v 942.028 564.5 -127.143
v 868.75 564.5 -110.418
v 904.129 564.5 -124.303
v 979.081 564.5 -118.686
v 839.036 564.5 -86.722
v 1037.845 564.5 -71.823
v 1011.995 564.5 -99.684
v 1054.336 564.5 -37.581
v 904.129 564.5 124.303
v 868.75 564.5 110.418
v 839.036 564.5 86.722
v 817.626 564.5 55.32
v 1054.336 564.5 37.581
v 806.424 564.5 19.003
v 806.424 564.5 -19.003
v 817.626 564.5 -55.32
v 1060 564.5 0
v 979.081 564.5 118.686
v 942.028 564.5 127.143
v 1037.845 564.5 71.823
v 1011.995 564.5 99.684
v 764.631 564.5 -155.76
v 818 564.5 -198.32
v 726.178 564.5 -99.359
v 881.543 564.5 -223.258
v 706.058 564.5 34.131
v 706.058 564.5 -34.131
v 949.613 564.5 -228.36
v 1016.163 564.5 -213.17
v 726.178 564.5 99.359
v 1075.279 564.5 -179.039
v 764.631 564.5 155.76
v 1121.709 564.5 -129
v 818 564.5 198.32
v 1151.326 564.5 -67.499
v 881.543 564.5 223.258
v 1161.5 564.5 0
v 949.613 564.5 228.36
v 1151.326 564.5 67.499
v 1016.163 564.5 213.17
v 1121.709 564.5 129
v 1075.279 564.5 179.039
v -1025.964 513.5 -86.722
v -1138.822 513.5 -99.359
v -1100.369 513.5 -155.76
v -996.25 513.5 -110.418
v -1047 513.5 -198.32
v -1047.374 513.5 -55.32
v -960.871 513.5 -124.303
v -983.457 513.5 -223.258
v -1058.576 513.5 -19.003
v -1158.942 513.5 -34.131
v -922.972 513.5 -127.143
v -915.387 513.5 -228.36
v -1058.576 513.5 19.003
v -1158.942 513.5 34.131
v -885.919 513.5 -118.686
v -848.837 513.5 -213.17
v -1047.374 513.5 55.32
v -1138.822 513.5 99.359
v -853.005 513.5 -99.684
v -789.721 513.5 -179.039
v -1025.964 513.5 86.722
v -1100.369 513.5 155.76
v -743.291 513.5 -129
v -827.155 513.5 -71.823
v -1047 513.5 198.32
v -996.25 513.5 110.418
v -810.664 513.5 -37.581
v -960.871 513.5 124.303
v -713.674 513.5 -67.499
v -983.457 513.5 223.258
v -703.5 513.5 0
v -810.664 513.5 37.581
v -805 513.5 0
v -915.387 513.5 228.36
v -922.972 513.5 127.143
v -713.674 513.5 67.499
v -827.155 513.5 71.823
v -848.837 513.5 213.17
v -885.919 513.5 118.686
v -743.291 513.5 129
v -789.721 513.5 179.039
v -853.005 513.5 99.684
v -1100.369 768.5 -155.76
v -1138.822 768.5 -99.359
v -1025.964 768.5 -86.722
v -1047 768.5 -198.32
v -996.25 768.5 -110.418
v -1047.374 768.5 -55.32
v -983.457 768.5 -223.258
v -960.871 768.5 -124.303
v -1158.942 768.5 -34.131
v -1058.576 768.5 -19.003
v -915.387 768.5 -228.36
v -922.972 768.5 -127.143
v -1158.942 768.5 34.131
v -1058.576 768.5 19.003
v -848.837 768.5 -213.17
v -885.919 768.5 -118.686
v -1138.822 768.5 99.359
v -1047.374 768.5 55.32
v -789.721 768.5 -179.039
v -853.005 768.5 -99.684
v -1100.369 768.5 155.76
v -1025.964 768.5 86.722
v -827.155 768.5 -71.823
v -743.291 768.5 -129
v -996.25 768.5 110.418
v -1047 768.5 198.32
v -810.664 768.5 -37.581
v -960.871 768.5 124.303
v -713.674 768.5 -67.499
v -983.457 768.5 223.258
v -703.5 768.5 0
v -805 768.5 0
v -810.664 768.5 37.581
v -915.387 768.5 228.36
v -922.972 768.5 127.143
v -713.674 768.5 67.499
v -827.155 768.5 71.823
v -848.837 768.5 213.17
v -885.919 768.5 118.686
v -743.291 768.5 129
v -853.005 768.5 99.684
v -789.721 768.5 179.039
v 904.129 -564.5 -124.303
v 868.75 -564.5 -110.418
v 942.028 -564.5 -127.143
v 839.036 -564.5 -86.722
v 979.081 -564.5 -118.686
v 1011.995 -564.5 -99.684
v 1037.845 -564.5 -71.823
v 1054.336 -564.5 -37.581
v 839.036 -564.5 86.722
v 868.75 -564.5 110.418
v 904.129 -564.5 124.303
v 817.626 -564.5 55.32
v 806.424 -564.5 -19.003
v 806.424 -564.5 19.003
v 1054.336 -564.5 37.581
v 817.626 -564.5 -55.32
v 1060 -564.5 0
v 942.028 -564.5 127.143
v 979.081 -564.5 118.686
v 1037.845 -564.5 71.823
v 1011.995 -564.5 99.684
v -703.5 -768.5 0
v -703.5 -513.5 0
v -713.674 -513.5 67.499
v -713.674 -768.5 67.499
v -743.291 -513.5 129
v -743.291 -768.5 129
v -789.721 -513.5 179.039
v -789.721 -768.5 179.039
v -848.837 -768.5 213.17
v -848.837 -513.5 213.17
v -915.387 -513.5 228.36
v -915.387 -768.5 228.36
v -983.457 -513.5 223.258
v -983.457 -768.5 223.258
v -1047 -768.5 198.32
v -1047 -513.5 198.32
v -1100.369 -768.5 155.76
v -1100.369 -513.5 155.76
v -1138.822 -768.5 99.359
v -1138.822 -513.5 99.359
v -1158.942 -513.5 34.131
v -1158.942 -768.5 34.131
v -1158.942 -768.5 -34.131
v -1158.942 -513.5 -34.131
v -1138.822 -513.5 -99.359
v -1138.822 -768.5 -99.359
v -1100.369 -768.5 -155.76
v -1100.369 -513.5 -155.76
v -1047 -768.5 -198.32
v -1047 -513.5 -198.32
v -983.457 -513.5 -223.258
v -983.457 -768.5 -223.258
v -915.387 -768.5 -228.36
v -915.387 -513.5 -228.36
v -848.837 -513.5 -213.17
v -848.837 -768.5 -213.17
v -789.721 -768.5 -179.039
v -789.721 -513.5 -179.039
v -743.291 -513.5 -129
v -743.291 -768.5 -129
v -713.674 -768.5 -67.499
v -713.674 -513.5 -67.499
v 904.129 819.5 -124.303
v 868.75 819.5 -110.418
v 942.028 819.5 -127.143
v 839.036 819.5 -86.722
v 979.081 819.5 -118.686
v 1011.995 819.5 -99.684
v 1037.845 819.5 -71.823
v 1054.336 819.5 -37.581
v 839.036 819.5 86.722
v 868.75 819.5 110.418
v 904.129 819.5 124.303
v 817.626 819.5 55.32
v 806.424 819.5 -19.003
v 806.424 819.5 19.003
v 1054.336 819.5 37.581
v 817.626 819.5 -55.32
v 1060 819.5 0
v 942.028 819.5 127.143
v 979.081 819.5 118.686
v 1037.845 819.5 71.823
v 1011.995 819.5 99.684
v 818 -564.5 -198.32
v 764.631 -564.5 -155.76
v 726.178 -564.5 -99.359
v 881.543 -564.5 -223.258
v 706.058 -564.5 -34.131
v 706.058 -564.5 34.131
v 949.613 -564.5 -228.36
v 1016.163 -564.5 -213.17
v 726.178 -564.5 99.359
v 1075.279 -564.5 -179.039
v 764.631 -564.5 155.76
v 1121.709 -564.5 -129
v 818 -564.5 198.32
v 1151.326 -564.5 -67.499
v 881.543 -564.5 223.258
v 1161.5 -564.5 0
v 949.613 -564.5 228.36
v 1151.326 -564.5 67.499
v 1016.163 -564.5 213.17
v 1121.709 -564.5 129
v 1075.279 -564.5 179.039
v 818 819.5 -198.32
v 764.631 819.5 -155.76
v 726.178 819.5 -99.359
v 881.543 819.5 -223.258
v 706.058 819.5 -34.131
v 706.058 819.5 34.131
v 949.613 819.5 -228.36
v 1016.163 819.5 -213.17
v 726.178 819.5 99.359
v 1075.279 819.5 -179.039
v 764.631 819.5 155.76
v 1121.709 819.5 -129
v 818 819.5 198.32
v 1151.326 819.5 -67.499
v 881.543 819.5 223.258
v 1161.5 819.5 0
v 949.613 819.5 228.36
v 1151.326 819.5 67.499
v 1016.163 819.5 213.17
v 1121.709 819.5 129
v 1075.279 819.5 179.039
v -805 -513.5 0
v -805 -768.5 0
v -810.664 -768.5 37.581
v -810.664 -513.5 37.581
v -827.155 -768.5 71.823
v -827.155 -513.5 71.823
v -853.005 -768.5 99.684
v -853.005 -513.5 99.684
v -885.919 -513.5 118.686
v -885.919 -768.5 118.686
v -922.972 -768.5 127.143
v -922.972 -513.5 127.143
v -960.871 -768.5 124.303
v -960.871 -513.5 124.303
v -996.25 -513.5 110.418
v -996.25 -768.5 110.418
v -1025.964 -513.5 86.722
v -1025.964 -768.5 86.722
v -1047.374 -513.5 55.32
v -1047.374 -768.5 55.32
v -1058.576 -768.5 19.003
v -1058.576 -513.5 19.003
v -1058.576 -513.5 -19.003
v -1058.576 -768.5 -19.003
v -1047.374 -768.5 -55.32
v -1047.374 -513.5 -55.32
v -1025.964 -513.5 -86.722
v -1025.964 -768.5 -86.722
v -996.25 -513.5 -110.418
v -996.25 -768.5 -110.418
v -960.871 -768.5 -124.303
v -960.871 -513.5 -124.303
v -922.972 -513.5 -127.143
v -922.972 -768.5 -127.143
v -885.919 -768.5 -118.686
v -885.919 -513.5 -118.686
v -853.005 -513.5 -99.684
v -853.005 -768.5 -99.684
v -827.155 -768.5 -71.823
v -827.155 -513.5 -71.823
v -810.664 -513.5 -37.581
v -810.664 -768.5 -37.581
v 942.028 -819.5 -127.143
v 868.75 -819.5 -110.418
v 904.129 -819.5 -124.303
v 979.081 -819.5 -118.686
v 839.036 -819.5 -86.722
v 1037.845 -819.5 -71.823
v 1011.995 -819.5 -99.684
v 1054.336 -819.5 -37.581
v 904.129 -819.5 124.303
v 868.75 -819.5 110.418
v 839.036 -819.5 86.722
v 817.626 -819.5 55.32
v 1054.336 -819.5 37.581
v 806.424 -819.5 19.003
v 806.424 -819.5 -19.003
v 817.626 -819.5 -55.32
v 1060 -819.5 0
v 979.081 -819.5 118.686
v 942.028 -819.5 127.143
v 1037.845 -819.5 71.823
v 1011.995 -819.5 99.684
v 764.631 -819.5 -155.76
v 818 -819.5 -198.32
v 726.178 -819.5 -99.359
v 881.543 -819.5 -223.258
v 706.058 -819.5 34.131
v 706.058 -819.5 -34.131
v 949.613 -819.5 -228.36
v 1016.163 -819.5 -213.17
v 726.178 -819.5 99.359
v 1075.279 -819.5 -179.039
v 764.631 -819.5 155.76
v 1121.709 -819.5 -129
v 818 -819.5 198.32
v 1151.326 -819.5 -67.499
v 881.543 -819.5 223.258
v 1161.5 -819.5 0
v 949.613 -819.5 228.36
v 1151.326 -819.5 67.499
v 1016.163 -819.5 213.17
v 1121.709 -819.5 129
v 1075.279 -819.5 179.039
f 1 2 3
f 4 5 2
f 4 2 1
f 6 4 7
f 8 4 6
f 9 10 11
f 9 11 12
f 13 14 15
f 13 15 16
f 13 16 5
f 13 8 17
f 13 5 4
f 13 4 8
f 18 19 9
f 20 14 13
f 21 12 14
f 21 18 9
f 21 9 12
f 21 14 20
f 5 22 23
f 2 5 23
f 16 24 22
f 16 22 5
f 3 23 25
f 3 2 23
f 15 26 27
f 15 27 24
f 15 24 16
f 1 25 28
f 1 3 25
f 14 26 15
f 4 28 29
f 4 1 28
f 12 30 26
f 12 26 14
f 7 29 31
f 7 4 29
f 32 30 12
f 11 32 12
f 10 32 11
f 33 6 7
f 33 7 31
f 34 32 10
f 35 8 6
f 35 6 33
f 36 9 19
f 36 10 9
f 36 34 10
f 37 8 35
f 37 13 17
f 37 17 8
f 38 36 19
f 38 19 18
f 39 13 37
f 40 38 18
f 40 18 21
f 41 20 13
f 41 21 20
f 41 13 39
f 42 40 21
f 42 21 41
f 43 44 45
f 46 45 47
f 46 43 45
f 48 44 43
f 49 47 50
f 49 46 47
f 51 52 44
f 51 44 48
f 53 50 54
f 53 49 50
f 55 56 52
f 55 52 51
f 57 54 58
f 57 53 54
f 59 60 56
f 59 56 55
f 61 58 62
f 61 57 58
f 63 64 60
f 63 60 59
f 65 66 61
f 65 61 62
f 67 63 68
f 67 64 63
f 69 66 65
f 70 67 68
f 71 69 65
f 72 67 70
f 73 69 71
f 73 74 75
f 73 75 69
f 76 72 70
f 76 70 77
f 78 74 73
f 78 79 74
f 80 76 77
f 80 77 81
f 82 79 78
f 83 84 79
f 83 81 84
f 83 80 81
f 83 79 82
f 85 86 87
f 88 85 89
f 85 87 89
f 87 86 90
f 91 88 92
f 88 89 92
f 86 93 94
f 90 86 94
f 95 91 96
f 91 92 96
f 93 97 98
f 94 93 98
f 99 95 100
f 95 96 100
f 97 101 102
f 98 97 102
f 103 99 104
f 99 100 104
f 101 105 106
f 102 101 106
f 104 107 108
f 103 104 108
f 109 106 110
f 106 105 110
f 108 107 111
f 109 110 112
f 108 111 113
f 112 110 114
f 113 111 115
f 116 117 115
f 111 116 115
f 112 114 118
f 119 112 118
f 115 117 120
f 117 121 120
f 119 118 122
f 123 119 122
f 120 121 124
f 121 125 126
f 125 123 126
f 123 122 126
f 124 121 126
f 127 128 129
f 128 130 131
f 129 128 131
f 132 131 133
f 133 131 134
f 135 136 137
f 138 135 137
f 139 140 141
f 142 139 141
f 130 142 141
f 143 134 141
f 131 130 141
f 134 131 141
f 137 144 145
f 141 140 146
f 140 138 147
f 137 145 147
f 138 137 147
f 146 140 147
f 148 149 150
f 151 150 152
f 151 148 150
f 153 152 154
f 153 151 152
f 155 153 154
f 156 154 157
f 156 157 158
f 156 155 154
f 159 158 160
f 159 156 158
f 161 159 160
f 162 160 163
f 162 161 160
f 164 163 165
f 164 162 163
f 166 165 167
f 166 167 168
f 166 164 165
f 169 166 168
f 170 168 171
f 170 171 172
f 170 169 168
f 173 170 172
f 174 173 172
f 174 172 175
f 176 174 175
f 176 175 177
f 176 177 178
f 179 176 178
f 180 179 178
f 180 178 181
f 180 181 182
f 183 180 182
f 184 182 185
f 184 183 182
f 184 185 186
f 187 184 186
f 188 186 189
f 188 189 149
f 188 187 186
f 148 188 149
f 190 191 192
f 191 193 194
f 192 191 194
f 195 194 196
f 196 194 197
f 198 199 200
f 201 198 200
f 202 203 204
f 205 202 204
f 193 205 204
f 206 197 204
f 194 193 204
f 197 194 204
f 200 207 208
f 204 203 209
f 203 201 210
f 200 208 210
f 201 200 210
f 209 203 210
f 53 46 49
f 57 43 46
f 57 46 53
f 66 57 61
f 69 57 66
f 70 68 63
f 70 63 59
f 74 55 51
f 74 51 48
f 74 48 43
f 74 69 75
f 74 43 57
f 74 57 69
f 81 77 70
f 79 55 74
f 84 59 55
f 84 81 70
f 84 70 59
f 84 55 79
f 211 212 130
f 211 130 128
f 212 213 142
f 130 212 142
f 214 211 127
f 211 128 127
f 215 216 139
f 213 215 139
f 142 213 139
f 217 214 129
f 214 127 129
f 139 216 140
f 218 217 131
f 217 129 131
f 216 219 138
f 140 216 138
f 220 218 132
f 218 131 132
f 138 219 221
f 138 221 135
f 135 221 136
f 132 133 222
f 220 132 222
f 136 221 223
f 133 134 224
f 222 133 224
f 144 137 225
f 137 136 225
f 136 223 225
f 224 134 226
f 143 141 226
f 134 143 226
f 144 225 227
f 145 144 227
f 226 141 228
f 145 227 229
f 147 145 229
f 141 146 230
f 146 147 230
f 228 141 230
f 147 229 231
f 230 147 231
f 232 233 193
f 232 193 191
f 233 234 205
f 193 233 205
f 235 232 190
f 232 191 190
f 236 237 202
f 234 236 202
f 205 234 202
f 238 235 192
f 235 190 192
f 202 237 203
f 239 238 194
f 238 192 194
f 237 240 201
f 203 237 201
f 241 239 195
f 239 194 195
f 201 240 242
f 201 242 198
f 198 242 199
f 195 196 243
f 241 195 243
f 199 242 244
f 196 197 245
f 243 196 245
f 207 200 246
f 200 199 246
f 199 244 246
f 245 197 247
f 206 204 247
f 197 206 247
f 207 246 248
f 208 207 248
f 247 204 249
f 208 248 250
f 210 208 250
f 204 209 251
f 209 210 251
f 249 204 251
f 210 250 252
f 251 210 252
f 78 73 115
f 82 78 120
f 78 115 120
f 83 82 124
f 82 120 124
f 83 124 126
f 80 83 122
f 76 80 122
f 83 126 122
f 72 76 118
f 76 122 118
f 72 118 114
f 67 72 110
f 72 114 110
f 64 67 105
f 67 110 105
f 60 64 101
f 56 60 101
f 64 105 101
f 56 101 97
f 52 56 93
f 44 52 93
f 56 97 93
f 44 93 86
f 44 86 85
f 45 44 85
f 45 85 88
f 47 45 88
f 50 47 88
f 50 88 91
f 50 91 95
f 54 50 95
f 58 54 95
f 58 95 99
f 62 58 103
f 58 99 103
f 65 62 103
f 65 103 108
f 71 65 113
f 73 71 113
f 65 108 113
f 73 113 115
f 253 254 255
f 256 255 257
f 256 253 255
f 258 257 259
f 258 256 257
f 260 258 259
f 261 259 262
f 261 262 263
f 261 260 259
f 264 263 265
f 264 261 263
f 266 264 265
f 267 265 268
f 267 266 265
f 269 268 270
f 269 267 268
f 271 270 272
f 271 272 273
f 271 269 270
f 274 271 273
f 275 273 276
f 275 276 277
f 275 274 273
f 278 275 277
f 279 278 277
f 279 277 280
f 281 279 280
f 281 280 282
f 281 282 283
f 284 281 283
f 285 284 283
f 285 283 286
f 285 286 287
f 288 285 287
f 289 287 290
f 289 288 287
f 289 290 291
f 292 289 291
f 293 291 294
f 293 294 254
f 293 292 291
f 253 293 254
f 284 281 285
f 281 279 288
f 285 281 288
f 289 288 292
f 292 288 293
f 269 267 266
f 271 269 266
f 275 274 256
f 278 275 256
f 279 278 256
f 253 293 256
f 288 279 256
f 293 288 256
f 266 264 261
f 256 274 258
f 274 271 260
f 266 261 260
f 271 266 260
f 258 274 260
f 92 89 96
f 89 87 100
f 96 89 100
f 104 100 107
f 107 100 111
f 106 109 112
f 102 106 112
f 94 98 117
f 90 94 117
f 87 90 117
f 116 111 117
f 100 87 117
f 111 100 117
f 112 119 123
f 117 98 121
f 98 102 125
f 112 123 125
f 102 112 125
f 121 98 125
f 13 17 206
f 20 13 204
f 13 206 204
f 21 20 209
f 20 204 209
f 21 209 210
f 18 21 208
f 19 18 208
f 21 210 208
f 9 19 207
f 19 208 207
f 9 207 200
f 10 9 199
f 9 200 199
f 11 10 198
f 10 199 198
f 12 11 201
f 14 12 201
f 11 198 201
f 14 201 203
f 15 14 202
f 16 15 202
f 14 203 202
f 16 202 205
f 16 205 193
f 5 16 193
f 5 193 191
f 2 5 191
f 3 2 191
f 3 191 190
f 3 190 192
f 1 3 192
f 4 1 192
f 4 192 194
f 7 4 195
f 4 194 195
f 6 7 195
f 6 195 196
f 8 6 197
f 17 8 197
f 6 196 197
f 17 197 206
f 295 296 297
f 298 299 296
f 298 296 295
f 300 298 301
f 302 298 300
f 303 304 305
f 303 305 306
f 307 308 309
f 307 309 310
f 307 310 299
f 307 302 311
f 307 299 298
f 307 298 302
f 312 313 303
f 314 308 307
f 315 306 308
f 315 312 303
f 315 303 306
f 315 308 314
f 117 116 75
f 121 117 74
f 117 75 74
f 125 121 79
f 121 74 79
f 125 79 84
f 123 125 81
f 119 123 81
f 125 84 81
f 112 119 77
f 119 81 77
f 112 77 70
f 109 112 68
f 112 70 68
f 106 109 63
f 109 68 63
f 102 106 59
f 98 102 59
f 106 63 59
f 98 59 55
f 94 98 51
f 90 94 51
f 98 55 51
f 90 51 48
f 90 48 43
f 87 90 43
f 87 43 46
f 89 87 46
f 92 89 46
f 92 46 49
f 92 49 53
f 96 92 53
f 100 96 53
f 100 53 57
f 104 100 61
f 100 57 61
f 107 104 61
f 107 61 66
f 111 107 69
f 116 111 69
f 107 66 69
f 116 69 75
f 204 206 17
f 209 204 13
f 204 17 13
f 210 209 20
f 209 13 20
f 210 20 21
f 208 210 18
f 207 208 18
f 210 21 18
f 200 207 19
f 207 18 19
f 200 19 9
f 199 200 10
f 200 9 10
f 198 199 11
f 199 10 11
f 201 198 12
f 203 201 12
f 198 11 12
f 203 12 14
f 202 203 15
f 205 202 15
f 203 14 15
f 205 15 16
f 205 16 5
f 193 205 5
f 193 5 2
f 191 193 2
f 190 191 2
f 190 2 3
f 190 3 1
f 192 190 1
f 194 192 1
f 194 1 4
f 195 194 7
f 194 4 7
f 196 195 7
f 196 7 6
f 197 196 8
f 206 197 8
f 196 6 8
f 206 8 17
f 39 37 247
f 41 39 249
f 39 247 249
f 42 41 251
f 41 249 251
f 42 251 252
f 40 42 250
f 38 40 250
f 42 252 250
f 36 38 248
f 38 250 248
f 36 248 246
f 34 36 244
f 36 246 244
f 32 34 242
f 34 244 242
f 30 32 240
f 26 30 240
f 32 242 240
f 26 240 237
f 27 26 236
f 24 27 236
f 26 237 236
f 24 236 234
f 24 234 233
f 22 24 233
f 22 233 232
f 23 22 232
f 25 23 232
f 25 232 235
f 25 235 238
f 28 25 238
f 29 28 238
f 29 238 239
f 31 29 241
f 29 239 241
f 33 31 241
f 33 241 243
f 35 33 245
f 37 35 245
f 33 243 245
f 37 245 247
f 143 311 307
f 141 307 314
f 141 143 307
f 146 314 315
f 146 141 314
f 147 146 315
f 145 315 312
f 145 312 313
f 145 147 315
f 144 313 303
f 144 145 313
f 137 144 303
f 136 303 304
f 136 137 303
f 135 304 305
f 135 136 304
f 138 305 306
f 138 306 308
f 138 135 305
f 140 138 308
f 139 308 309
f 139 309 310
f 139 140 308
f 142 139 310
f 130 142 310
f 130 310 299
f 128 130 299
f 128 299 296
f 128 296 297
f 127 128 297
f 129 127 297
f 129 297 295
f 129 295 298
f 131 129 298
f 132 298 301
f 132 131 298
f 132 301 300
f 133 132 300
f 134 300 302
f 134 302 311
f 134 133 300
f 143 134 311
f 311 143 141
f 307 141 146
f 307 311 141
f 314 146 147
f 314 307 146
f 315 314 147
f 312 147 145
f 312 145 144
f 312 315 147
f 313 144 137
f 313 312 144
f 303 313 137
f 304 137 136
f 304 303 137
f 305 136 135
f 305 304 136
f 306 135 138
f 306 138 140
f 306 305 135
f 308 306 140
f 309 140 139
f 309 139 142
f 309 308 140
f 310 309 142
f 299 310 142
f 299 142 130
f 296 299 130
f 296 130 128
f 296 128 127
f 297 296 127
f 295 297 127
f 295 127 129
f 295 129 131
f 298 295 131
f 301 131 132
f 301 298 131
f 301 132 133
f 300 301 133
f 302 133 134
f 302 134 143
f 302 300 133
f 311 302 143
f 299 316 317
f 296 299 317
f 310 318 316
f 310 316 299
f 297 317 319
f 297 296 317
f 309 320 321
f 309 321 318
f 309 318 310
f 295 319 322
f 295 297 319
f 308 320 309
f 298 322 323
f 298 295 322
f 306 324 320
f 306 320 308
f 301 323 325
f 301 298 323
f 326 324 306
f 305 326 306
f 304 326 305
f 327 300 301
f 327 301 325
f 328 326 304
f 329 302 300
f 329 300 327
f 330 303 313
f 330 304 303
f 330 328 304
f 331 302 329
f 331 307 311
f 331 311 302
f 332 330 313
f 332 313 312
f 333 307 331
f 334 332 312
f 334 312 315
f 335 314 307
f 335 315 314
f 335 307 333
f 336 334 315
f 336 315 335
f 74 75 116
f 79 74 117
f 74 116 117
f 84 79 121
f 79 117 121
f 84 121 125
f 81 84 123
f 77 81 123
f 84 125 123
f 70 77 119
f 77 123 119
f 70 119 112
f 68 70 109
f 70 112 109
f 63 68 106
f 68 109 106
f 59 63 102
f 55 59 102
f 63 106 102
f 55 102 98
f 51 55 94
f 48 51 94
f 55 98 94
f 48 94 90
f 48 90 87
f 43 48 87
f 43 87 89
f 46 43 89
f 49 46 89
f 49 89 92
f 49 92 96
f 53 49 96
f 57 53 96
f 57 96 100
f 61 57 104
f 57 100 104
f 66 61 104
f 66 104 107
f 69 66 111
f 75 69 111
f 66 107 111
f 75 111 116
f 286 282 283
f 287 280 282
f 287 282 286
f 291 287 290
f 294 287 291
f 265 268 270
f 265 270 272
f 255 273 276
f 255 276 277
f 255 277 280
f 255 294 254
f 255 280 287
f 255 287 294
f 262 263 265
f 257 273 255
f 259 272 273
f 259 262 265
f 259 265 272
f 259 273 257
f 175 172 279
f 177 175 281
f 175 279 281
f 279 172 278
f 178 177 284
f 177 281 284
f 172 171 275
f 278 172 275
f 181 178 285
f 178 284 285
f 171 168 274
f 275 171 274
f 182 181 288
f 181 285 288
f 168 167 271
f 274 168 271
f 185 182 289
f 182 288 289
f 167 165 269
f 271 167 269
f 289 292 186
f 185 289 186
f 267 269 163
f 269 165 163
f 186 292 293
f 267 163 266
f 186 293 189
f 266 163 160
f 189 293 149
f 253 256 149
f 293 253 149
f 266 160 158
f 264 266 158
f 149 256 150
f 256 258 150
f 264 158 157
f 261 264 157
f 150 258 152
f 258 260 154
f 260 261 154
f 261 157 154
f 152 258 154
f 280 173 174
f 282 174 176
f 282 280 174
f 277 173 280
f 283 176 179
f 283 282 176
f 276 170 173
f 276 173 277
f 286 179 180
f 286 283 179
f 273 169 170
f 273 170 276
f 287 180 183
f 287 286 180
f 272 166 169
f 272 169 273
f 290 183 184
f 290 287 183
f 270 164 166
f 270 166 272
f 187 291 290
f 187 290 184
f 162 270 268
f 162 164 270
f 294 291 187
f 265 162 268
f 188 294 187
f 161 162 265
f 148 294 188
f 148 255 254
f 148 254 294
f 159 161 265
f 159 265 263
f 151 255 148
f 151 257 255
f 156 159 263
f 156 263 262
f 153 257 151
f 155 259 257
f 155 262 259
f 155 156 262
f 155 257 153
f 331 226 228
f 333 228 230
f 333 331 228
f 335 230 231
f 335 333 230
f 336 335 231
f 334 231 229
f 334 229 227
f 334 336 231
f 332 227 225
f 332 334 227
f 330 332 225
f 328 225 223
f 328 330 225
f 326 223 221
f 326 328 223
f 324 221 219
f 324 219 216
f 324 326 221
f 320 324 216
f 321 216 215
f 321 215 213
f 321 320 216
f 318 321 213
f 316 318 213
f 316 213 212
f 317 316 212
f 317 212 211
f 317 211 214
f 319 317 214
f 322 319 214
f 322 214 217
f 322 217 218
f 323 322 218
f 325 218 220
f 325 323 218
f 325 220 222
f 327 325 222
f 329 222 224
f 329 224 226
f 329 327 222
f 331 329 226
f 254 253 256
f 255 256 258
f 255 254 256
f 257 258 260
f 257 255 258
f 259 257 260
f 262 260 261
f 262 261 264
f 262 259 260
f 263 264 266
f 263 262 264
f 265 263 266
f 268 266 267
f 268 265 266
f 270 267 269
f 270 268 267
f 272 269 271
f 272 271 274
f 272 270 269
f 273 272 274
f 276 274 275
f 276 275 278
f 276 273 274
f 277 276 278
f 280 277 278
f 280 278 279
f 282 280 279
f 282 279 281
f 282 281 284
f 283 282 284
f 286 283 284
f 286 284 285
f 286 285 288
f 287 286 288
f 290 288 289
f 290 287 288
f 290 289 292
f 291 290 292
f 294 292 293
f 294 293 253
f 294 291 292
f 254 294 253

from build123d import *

# Parameters (mm, degrees)
F2_R     = 127.5
F3_DEPTH = 127.5
F2_R_2   = 229
F4_DEPTH = 127.5
F7_R     = 229
F7_R_2   = 127.5
F8_DEPTH = 127.5
F9_DEPTH = 127.5


with BuildPart() as f3:
    # F2 (on offset) → F3 (new body, symmetric)
    with BuildSketch(Plane.XZ.offset(692)):
        with Locations((932.5, 0)):
            Circle(F2_R)
    extrude(amount=F3_DEPTH, both=True)


with BuildPart() as f4:
    # F2 (on offset) → F4 (new body, symmetric)
    with BuildSketch(Plane.XZ.offset(692)):
        with Locations((932.5, 0)):
            Circle(F2_R_2)
        with Locations((932.5, 0)):
            Circle(F2_R, mode=Mode.SUBTRACT)
    extrude(amount=F4_DEPTH, both=True)


with BuildPart() as f5_1:
    # F5: instance of F3
    add(f3.part.mirror(Plane.XZ))


with BuildPart() as f5_2:
    # F5: instance of F4
    add(f4.part.mirror(Plane.XZ))


with BuildPart() as f8:
    # F7 (on offset) → F8 (new body, symmetric)
    with BuildSketch(Plane.XZ.offset(641)):
        with Locations((-932.5, 0)):
            Circle(F7_R)
        with Locations((-932.5, 0)):
            Circle(F7_R_2, mode=Mode.SUBTRACT)
    extrude(amount=F8_DEPTH, both=True)


with BuildPart() as f9:
    # F7 (on offset) → F9 (new body, symmetric)
    with BuildSketch(Plane.XZ.offset(641)):
        with Locations((-932.5, 0)):
            Circle(F7_R_2)
    extrude(amount=F9_DEPTH, both=True)


with BuildPart() as f10_1:
    # F10: instance of F8
    add(f8.part.mirror(Plane.XZ))


with BuildPart() as f10_2:
    # F10: instance of F9
    add(f9.part.mirror(Plane.XZ))


solid = Compound([f3.part, f4.part, f5_1.part, f5_2.part, f8.part, f9.part, f10_1.part, f10_2.part])
